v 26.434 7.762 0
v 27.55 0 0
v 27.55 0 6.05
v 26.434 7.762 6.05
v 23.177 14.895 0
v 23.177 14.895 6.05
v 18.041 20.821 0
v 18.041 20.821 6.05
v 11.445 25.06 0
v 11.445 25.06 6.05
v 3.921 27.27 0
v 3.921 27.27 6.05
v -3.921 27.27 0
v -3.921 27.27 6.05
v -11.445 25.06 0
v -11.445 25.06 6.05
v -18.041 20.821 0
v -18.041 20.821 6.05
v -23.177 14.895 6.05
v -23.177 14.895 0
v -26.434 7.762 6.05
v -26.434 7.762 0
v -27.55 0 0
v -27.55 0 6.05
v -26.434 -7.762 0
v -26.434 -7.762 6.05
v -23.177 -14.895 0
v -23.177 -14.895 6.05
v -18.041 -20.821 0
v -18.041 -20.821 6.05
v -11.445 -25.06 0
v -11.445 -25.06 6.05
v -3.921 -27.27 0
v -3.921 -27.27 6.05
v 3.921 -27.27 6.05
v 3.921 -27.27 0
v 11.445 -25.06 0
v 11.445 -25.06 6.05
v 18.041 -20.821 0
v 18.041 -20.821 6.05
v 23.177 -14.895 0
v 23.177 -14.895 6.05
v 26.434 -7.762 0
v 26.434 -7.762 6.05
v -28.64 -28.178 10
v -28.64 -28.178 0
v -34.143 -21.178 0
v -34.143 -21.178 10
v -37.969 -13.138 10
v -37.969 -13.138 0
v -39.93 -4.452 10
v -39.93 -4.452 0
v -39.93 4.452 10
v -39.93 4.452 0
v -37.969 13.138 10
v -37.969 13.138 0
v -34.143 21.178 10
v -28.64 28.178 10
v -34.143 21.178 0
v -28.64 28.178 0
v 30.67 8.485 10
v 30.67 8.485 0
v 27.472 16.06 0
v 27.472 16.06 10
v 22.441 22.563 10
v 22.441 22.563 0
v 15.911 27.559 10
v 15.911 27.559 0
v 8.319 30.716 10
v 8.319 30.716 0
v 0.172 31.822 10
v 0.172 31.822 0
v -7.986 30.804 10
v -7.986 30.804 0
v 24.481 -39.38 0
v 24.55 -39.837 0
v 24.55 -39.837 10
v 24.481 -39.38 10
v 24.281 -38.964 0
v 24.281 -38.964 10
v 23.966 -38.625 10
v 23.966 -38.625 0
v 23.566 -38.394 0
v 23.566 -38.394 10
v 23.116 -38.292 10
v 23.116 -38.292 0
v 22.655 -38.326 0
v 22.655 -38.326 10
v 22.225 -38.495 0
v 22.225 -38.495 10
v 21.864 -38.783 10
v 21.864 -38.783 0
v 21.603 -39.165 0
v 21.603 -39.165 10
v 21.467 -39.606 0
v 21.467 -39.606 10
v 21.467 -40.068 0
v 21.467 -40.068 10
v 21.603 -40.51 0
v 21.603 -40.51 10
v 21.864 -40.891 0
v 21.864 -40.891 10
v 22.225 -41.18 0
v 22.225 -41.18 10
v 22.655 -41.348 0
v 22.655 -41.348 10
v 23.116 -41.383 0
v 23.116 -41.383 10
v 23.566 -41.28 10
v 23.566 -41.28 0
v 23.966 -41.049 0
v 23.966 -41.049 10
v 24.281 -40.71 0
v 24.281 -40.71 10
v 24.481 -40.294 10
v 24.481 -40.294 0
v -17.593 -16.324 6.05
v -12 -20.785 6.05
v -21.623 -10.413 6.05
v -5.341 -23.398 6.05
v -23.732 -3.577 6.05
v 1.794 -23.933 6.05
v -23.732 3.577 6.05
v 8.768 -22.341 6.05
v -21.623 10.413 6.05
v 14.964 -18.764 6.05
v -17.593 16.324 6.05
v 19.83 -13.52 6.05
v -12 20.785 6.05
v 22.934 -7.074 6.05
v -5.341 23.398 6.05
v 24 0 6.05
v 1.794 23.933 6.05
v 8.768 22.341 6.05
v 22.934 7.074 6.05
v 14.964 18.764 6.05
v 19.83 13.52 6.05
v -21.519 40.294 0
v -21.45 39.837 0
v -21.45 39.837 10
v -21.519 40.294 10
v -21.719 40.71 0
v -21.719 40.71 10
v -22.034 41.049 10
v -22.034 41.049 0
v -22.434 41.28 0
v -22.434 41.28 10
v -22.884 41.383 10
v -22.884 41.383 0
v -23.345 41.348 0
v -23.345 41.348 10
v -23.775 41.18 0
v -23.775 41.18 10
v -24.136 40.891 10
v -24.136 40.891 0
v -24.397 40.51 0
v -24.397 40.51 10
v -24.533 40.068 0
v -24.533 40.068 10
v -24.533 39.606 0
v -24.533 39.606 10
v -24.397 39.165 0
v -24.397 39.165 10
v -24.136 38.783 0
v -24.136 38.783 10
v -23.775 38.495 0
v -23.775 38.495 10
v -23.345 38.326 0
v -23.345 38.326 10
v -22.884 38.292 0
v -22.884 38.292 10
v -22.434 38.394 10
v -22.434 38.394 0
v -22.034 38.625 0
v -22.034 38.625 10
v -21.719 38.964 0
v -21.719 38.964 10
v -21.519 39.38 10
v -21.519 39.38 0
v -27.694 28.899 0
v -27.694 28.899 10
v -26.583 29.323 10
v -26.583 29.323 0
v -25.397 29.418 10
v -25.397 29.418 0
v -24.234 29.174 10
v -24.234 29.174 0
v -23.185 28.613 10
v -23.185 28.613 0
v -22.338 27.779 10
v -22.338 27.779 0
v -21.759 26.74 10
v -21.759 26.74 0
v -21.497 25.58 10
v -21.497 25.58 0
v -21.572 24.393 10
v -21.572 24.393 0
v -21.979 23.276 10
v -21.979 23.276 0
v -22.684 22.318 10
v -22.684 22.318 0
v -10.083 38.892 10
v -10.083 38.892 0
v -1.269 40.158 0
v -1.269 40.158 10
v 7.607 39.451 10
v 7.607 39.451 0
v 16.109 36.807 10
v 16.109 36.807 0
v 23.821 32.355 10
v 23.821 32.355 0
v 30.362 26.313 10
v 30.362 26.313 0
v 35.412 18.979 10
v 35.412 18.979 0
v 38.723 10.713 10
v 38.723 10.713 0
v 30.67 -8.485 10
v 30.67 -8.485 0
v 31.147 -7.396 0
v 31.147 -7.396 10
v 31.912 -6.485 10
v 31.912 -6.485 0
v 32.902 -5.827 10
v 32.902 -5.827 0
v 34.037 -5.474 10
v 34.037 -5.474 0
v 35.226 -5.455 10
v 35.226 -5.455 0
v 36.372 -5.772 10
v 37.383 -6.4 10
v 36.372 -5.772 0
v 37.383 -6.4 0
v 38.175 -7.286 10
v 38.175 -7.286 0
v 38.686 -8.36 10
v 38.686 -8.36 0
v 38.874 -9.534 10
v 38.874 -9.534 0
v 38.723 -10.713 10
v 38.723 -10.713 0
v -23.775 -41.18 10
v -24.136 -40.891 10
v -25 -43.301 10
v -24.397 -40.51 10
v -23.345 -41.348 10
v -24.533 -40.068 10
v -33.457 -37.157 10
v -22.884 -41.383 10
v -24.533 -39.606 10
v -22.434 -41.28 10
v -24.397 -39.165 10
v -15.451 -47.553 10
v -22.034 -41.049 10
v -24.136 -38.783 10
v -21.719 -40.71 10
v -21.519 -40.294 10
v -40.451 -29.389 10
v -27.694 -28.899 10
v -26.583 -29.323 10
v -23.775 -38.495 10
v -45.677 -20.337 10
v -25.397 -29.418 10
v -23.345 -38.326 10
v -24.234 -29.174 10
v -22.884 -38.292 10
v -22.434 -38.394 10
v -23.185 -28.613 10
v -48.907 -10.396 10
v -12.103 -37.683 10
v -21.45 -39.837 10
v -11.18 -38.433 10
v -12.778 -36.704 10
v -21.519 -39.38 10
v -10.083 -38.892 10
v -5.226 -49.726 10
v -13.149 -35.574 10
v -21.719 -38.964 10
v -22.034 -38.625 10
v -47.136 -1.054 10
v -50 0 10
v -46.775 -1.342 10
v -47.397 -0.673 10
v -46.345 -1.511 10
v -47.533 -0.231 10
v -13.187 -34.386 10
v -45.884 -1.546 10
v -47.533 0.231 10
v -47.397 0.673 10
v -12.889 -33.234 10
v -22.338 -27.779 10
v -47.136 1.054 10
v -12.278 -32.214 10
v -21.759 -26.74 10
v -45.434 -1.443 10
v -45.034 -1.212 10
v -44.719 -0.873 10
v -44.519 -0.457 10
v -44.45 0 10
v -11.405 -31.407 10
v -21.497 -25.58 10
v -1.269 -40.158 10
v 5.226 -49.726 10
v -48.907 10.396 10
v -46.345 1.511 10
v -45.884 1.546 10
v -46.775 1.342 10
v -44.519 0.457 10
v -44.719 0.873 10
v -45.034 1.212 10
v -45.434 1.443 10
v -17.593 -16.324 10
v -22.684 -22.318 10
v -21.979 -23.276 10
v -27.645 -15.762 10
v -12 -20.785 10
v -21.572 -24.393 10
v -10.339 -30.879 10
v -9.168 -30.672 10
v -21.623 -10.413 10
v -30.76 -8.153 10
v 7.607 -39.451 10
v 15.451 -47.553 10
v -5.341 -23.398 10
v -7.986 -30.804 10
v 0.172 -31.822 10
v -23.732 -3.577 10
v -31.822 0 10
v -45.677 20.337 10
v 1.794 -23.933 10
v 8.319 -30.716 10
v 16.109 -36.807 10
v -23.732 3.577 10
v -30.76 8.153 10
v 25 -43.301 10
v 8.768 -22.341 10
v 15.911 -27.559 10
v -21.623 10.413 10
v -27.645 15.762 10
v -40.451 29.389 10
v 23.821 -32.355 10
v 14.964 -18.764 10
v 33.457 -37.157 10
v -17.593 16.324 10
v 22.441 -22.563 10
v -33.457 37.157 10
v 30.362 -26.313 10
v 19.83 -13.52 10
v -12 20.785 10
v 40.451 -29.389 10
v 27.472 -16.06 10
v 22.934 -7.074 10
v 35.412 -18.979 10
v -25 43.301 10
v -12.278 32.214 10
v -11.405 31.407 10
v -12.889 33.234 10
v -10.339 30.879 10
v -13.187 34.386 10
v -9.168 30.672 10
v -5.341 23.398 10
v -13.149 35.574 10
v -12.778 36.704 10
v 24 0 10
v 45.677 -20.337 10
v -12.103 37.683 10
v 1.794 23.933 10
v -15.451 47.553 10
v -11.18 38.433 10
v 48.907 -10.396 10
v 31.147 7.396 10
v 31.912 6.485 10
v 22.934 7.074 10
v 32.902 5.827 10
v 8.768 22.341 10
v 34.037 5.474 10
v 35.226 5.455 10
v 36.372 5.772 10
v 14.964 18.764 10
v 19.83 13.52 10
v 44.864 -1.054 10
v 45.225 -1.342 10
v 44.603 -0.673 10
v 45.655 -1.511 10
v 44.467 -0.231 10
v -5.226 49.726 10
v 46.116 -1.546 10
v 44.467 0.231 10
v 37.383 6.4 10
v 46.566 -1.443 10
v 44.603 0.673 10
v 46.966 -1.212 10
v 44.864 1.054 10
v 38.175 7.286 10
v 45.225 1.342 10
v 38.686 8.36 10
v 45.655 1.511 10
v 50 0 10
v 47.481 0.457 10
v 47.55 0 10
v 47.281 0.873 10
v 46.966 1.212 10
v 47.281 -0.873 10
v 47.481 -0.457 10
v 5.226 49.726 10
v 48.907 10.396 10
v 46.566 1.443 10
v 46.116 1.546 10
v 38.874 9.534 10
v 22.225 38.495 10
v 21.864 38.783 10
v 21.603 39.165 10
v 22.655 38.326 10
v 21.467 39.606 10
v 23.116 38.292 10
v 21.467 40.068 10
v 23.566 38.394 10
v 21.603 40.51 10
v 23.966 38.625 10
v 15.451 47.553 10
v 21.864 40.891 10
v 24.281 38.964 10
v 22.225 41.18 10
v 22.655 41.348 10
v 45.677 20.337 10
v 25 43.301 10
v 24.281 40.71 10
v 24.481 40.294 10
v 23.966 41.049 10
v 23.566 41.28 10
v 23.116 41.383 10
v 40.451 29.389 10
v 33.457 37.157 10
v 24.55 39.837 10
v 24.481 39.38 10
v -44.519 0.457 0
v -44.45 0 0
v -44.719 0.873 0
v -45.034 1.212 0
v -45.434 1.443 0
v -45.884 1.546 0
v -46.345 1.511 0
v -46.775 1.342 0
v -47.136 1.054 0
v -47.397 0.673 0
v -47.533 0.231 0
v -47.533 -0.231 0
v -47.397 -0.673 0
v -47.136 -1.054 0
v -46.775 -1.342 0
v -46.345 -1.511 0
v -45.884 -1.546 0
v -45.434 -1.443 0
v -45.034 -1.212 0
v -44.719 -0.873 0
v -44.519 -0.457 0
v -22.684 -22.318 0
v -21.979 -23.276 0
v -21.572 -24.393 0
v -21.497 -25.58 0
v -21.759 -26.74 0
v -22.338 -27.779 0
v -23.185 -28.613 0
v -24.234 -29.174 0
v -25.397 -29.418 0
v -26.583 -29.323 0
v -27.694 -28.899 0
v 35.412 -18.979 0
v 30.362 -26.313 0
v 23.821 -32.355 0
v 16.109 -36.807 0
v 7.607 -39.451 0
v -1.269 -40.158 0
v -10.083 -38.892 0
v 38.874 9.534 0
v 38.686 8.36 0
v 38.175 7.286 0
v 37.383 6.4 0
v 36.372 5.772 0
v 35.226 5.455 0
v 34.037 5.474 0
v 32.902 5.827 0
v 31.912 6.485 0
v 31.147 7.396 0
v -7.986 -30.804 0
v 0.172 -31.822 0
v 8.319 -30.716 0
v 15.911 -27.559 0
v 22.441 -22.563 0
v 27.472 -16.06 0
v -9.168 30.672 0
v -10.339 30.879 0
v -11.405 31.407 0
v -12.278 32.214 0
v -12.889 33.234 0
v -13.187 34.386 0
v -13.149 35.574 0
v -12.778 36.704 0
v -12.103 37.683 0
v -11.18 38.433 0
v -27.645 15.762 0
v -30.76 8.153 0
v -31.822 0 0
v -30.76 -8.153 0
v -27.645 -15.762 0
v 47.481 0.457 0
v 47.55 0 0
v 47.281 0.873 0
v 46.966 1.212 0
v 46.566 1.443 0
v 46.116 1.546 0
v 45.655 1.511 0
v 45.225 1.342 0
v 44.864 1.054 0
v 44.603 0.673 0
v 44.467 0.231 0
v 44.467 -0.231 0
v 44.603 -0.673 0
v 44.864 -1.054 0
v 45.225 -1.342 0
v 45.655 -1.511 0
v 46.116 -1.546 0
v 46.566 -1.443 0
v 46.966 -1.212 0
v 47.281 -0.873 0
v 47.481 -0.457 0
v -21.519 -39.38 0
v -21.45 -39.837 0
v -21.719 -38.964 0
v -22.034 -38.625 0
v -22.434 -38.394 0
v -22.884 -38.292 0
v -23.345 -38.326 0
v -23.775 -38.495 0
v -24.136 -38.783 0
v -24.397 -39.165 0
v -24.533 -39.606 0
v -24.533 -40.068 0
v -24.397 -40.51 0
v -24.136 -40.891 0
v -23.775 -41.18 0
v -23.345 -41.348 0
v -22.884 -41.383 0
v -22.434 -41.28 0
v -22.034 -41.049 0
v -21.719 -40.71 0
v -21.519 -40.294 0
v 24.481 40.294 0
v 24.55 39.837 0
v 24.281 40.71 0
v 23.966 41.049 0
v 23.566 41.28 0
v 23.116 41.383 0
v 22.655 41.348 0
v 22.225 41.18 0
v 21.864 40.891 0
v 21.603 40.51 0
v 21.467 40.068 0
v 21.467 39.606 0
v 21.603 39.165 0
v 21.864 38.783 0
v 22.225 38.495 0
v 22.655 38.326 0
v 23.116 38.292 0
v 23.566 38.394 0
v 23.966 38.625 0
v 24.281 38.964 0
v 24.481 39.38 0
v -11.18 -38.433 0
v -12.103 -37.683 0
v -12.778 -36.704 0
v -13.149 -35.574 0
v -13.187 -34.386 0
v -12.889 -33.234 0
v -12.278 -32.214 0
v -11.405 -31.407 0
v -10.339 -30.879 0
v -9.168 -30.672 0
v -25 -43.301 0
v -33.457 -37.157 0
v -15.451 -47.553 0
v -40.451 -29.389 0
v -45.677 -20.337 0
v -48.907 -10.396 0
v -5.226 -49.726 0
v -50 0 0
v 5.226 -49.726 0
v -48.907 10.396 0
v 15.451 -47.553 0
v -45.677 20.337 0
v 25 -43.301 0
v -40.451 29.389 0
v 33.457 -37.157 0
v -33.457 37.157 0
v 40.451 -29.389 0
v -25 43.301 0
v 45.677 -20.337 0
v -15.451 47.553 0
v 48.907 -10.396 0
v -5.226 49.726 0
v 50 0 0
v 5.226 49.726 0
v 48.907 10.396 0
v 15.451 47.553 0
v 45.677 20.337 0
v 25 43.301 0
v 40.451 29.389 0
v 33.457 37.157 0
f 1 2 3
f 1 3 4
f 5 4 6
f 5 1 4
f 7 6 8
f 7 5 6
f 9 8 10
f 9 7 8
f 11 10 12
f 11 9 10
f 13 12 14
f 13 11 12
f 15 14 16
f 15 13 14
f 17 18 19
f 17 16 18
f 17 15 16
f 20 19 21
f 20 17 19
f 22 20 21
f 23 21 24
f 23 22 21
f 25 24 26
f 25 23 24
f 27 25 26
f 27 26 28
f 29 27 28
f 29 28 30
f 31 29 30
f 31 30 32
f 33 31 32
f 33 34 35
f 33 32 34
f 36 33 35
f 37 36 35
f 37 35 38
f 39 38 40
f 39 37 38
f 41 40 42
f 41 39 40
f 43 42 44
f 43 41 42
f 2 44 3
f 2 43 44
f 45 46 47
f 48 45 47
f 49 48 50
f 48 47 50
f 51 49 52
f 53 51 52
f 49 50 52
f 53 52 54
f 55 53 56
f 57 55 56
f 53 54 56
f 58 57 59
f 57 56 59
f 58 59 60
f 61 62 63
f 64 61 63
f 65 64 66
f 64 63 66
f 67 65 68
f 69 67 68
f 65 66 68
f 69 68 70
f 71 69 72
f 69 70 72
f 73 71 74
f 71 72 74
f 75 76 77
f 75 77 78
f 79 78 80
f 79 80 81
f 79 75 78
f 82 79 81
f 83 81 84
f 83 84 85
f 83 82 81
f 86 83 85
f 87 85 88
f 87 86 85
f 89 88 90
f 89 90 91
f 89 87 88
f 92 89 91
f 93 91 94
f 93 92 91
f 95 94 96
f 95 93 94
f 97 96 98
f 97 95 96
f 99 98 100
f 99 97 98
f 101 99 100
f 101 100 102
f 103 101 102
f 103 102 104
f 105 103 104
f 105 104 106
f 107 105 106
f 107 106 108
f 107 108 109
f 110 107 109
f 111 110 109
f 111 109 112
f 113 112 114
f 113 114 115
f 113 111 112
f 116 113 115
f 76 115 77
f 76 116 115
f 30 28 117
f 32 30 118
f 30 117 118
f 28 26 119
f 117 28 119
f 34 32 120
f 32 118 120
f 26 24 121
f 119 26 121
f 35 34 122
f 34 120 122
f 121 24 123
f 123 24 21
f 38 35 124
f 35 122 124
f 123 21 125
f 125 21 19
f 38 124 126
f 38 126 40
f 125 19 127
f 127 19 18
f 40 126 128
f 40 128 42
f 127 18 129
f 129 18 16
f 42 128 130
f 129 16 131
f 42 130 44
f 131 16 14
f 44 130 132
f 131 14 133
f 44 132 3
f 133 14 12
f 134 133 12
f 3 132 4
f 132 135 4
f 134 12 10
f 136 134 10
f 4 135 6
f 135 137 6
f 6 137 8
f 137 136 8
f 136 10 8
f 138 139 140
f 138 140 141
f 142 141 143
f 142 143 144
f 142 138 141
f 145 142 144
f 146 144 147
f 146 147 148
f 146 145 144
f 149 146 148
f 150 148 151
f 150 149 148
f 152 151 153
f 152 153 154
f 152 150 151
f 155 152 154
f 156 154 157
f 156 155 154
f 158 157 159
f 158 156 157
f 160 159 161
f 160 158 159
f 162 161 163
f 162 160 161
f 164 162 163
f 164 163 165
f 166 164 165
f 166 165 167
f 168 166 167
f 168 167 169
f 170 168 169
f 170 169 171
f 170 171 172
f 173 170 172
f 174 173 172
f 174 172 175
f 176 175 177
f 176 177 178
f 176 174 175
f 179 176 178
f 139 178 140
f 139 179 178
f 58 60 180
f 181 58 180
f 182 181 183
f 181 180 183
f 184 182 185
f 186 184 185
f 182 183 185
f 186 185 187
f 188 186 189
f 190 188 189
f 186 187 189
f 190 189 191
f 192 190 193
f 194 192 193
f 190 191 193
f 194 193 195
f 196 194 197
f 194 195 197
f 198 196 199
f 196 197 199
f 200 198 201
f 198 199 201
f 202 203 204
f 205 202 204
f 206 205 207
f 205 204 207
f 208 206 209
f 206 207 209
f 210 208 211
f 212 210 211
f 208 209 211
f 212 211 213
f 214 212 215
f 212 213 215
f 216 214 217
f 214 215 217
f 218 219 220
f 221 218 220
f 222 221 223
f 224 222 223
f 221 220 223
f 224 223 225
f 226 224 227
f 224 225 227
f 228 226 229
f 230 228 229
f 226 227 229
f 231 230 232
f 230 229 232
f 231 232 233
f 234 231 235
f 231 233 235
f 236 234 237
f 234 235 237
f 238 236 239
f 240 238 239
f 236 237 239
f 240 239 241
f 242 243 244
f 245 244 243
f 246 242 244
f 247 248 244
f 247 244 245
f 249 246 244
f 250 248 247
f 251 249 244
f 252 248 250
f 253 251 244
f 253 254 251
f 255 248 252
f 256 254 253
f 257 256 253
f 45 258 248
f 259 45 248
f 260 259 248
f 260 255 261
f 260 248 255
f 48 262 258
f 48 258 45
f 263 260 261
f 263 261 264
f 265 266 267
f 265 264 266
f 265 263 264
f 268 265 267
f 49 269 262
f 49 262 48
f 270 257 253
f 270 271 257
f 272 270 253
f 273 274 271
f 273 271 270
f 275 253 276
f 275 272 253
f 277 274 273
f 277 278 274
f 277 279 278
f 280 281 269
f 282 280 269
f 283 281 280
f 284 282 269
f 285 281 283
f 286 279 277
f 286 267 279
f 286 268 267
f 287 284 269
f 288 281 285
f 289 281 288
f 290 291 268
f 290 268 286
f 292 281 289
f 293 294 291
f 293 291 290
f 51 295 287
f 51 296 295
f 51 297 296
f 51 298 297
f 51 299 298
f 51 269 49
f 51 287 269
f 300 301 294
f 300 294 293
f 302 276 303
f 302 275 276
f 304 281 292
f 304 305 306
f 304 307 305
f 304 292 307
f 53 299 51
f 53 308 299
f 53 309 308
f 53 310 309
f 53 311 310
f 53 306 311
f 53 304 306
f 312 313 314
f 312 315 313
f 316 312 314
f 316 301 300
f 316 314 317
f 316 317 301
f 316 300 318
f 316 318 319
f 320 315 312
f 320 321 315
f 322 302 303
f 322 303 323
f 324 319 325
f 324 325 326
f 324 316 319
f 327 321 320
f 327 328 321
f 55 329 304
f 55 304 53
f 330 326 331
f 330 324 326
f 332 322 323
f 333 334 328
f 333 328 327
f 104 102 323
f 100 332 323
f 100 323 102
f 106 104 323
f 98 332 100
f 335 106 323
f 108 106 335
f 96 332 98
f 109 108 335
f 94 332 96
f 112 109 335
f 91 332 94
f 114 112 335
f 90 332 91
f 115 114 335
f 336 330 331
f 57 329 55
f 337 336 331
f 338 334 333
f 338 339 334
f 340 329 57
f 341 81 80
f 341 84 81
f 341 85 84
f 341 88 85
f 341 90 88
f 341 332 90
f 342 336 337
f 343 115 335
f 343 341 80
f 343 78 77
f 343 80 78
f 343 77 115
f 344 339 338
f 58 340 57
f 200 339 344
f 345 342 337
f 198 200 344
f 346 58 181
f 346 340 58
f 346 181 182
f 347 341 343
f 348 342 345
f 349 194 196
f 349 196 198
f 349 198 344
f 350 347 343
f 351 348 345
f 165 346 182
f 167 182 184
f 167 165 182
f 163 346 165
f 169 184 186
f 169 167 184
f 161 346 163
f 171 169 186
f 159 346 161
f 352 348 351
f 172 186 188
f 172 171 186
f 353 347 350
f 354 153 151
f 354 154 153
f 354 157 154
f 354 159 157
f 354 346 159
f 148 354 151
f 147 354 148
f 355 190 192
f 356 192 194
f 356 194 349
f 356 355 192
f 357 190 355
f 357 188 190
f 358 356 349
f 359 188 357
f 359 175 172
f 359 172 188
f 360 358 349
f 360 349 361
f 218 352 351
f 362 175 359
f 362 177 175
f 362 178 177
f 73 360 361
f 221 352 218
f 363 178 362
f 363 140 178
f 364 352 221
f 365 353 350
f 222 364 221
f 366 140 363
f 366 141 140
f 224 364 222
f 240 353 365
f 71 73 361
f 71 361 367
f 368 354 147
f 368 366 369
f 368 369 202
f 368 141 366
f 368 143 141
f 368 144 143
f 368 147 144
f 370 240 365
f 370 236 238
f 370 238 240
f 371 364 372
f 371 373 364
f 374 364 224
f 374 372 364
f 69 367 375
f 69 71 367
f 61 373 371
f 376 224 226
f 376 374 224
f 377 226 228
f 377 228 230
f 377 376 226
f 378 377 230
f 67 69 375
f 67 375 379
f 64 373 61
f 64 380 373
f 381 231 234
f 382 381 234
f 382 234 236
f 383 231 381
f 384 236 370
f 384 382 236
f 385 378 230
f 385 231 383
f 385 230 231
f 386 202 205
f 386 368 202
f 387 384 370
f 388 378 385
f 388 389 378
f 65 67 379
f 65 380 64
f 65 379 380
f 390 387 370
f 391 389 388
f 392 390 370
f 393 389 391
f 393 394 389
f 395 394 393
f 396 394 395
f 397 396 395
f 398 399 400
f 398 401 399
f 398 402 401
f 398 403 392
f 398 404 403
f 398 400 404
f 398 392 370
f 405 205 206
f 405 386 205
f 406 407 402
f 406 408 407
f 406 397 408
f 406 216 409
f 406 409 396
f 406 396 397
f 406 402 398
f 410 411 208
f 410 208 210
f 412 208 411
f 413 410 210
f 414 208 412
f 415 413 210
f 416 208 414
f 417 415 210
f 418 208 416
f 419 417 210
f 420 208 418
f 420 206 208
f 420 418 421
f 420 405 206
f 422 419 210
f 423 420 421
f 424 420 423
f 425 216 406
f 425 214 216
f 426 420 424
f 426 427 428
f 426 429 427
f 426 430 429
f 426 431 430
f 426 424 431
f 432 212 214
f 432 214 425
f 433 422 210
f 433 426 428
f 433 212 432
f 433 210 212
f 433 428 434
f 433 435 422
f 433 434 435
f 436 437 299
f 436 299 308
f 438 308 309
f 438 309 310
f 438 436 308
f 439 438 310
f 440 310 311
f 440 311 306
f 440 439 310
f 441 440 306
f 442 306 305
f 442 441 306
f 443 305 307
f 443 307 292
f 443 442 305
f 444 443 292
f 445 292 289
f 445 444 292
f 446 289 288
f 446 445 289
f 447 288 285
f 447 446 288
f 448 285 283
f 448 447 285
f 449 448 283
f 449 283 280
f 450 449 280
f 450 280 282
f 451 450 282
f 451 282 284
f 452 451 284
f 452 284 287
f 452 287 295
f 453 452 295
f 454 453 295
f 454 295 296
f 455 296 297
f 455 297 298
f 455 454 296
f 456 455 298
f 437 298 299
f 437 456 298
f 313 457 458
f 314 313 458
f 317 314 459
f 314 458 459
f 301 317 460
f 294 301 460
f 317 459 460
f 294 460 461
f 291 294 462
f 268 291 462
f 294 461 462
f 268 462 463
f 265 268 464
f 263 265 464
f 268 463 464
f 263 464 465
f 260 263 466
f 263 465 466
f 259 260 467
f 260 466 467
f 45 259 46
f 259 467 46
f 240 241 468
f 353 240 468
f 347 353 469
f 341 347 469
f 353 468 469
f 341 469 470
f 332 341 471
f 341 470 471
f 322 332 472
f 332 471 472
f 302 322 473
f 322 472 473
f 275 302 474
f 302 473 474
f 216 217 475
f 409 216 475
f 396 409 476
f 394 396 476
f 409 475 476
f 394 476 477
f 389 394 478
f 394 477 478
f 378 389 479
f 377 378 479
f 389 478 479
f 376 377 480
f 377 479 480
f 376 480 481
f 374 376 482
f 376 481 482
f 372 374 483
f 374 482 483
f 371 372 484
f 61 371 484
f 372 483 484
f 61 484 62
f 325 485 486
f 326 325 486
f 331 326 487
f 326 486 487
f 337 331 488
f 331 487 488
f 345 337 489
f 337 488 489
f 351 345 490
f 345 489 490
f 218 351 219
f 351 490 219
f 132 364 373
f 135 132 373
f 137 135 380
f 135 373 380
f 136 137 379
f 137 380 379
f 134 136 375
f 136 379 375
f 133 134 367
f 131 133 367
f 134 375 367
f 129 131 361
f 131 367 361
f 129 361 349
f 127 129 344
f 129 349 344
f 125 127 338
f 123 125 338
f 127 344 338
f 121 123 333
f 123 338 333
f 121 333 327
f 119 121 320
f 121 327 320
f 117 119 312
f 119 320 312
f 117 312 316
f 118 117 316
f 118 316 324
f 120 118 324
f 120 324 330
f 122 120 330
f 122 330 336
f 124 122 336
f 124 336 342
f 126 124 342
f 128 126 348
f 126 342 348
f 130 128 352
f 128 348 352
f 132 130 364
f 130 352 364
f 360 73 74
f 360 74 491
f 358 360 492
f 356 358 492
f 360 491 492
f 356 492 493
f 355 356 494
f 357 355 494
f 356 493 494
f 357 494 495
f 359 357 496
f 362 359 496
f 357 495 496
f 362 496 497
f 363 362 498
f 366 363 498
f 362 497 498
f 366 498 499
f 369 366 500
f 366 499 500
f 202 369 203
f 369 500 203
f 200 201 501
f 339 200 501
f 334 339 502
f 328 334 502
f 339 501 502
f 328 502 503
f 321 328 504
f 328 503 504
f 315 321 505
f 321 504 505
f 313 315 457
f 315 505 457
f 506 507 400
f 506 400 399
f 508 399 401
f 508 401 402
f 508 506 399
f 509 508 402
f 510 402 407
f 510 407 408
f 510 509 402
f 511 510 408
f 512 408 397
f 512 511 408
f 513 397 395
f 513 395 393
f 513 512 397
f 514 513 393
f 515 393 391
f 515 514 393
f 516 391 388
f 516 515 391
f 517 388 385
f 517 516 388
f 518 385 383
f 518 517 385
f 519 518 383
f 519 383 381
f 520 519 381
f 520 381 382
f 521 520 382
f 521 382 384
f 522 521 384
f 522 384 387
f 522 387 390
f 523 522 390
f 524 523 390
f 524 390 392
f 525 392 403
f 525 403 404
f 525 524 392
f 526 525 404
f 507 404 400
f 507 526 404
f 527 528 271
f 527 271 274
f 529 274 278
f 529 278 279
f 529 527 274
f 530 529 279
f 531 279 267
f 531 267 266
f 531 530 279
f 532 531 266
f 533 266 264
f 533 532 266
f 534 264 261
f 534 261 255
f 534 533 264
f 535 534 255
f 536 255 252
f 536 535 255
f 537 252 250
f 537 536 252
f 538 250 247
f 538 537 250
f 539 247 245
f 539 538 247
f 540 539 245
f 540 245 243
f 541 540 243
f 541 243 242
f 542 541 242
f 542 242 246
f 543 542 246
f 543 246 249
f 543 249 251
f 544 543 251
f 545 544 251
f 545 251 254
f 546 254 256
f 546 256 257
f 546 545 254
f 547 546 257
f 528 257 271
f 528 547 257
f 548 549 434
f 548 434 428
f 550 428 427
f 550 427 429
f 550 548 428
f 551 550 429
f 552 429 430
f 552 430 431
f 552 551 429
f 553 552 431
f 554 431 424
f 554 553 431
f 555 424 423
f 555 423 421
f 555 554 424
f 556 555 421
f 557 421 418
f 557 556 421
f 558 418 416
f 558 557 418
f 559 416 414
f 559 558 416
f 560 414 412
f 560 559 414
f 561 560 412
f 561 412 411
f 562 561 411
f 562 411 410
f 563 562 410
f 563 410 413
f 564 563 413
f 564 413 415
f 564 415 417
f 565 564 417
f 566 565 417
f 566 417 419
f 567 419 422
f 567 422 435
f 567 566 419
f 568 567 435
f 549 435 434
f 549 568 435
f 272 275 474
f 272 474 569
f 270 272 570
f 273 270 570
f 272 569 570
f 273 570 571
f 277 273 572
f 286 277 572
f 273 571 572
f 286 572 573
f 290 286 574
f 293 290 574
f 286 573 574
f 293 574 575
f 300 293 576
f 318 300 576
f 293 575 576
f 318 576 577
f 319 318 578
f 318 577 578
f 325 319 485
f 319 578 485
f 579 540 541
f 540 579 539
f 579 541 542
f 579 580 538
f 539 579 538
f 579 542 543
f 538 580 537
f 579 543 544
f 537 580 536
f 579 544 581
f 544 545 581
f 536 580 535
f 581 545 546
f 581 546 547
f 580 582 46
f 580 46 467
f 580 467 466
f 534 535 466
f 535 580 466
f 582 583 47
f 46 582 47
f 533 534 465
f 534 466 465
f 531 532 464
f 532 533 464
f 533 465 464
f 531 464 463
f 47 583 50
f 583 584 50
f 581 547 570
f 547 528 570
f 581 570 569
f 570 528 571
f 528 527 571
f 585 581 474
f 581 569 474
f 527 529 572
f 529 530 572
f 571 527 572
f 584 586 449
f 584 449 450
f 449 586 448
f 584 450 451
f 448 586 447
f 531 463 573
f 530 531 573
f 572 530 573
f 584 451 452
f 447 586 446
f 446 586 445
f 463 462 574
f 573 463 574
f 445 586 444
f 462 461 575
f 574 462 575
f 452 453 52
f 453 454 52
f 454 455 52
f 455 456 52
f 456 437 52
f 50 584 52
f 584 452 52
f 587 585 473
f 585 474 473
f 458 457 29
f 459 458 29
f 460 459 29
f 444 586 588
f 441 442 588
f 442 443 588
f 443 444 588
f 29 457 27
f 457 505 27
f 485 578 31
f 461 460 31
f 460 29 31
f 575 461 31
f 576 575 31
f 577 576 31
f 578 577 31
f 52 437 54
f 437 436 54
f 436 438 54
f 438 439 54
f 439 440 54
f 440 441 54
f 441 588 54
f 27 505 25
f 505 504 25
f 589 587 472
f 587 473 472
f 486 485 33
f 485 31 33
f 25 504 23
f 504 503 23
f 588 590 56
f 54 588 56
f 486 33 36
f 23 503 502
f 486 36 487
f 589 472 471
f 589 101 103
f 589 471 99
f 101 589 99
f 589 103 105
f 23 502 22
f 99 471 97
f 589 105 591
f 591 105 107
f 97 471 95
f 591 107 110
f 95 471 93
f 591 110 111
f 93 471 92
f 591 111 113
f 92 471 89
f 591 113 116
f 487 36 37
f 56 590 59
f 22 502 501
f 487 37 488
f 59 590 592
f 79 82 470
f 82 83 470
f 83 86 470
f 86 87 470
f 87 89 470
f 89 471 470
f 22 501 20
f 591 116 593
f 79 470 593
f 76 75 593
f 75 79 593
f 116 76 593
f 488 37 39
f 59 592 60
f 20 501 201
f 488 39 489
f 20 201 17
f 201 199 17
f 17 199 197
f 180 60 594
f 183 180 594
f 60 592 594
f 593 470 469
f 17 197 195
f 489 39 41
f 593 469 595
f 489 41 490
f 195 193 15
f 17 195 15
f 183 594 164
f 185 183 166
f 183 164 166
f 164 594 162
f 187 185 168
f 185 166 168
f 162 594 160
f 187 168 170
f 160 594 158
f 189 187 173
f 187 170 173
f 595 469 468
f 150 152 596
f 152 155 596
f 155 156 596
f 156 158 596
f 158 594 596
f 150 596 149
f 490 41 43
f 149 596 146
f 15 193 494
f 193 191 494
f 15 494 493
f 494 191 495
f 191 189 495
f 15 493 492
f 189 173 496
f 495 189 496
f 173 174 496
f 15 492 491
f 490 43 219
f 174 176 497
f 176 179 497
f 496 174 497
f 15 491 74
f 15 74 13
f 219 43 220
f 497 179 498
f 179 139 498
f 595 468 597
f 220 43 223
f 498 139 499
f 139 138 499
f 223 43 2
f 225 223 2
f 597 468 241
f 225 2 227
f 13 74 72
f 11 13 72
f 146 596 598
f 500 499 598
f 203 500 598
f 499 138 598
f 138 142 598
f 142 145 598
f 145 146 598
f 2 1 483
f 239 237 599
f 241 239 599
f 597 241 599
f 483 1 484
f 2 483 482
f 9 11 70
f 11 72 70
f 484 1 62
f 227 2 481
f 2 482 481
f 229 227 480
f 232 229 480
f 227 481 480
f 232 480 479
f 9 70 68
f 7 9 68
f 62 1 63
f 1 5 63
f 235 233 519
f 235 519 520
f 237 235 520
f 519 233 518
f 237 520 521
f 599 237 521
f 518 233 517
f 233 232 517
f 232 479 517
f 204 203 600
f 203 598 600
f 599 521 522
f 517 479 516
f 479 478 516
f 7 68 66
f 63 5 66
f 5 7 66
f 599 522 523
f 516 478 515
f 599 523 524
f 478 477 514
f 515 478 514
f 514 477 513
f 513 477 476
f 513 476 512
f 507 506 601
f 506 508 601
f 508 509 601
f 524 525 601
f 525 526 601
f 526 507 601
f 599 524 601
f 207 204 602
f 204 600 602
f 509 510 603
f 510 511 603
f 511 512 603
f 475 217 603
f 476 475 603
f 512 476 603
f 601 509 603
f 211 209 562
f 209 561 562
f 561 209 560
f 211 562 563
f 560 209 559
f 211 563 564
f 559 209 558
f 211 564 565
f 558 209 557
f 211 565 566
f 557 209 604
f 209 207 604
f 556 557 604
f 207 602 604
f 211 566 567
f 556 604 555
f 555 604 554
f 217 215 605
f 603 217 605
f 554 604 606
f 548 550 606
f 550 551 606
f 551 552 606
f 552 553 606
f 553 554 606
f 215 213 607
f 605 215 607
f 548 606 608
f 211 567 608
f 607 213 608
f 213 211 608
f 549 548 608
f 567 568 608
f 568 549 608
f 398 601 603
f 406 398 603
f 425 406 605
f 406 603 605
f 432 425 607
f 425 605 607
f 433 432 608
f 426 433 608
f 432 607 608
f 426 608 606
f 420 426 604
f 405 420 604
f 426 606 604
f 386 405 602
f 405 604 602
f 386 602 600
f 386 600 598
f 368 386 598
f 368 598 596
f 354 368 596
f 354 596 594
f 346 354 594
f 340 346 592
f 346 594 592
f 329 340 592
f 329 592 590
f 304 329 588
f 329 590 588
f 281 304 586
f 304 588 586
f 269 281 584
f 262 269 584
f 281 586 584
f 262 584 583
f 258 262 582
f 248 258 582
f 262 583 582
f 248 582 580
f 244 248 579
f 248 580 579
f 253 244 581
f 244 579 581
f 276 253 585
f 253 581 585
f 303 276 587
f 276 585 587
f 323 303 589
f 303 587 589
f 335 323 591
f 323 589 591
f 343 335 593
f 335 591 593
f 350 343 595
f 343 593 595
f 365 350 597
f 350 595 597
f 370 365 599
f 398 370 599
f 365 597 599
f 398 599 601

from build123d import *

# Parameters (mm, degrees)
SKETCH_1_R          = 50
SKETCH_1_R_2        = 42
SKETCH_1_R_3        = 1.55
EXTRUDE_1_DEPTH     = 10
EXTRUDE_START       = -10
SKETCH_3_R          = 42
SKETCH_3_R_2        = 27.55
EXTRUDE_2_DEPTH     = 10
SKETCH_5_R          = 28.648994564
SKETCH_5_R_2        = 24
EXTRUDE_4_DEPTH     = 3.95
CUT_EXTRUDE_1_DEPTH = 10


with BuildPart() as part:
    # 草图1 → 凸台-拉伸1 (new body)
    with BuildSketch(Plane.XY):
        Circle(SKETCH_1_R)
        Circle(SKETCH_1_R_2, mode=Mode.SUBTRACT)
        with Locations((46, 0)):
            Circle(SKETCH_1_R_3, mode=Mode.SUBTRACT)
        with Locations((23, -39.837168574)):
            Circle(SKETCH_1_R_3, mode=Mode.SUBTRACT)
        with Locations((-23, -39.837168574)):
            Circle(SKETCH_1_R_3, mode=Mode.SUBTRACT)
        with Locations((-46, 0)):
            Circle(SKETCH_1_R_3, mode=Mode.SUBTRACT)
        with Locations((-23, 39.837168574)):
            Circle(SKETCH_1_R_3, mode=Mode.SUBTRACT)
        with Locations((23, 39.837168574)):
            Circle(SKETCH_1_R_3, mode=Mode.SUBTRACT)
    extrude(amount=EXTRUDE_1_DEPTH)

    # 草图3 → 凸台-拉伸2 (add)
    with BuildSketch(Plane.XY.offset(10).offset(EXTRUDE_START)):
        Circle(SKETCH_3_R)
        Circle(SKETCH_3_R_2, mode=Mode.SUBTRACT)
    extrude(amount=EXTRUDE_2_DEPTH)

    # 草图5 → 凸台-拉伸4 (add)
    with BuildSketch(Plane.XY.offset(10)):
        Circle(SKETCH_5_R)
        Circle(SKETCH_5_R_2, mode=Mode.SUBTRACT)
    extrude(amount=-EXTRUDE_4_DEPTH)

    # 草图6 → 切除-拉伸1 (cut)
    with BuildSketch(Plane(origin=(0, 0, 0), x_dir=(-1, 0, 0), z_dir=(0, 0, -1))):
        with BuildLine():
            ThreePointArc((10.083378512, 38.891869692), (-20.088877833, 34.794957074), (-38.72303641, 10.713472899))
            ThreePointArc((-38.72303641, 10.713472899), (-35.810551361, 5.572975291), (-30.670053754, 8.48546034))
            ThreePointArc((-30.670053754, 8.48546034), (-15.911122167, 27.558871999), (7.98640266, 30.803775856))
            ThreePointArc((7.98640266, 30.803775856), (13.078937504, 33.799334848), (10.083378512, 38.891869692))
        make_face()
        with BuildLine():
            ThreePointArc((28.639657898, -28.178396793), (40.177755666, 0), (28.639657898, 28.178396793))
            ThreePointArc((28.639657898, 28.178396793), (22.731613858, 28.226359557), (22.683651094, 22.318315516))
            ThreePointArc((22.683651094, 22.318315516), (31.822244334, 0), (22.683651094, -22.318315516))
            ThreePointArc((22.683651094, -22.318315516), (22.731613858, -28.226359557), (28.639657898, -28.178396793))
        make_face()
        with BuildLine():
            ThreePointArc((-38.72303641, -10.713472899), (-20.088877833, -34.794957074), (10.083378512, -38.891869692))
            ThreePointArc((10.083378512, -38.891869692), (13.078937504, -33.799334848), (7.98640266, -30.803775856))
            ThreePointArc((7.98640266, -30.803775856), (-15.911122167, -27.558871999), (-30.670053754, -8.48546034))
            ThreePointArc((-30.670053754, -8.48546034), (-35.810551361, -5.572975291), (-38.72303641, -10.713472899))
        make_face()
    extrude(amount=-CUT_EXTRUDE_1_DEPTH, mode=Mode.SUBTRACT)


solid = part.part
